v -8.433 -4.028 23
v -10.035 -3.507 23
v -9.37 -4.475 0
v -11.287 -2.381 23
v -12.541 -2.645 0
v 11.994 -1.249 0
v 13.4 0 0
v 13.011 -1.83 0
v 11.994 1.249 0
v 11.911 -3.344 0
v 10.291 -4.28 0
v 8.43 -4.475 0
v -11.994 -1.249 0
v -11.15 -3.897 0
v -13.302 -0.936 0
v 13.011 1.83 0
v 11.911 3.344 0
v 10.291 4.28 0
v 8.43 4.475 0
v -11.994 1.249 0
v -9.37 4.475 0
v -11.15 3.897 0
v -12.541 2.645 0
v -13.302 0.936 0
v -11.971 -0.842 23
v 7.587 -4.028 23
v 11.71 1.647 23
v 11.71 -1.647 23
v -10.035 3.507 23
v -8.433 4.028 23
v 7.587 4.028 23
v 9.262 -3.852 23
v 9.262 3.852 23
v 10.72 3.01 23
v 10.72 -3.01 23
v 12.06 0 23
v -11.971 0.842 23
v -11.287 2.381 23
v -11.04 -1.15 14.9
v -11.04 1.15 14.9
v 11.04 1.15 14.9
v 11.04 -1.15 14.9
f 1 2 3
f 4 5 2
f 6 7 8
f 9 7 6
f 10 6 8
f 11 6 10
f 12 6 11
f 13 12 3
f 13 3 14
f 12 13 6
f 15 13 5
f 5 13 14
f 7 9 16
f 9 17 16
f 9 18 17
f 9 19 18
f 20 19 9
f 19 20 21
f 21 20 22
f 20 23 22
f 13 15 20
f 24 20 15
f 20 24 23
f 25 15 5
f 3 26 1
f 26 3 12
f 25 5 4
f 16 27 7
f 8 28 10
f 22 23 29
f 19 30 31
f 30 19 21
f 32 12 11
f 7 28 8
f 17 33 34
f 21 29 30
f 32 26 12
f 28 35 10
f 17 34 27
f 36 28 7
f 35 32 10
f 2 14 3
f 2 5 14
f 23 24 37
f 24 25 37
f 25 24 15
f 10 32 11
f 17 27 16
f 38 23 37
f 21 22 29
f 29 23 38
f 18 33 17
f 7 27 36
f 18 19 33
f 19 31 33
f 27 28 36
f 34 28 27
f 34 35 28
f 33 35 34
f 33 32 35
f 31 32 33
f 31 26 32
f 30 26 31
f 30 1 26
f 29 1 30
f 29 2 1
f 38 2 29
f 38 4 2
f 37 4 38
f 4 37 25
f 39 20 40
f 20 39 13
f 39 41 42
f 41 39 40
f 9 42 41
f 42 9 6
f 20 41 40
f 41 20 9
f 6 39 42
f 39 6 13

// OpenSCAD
module switchOuter() {
    linear_extrude(23, scale=0.9) {
        hull() {
            translate([-(26.8-9)/2,0,0])
                circle(d = 9);
            translate([(26.8-9)/2,0,0])
                circle(d = 9);
        }
    }
}

module switchInner() {
    linear_extrude(15, scale=0.92) {
        square([24,2.5], center = true);
    }
}

module switchBody() {
    difference() {
        switchOuter();
        translate([0,0,-0.1]) {
            switchInner();
        }
    }
}

switchBody();
